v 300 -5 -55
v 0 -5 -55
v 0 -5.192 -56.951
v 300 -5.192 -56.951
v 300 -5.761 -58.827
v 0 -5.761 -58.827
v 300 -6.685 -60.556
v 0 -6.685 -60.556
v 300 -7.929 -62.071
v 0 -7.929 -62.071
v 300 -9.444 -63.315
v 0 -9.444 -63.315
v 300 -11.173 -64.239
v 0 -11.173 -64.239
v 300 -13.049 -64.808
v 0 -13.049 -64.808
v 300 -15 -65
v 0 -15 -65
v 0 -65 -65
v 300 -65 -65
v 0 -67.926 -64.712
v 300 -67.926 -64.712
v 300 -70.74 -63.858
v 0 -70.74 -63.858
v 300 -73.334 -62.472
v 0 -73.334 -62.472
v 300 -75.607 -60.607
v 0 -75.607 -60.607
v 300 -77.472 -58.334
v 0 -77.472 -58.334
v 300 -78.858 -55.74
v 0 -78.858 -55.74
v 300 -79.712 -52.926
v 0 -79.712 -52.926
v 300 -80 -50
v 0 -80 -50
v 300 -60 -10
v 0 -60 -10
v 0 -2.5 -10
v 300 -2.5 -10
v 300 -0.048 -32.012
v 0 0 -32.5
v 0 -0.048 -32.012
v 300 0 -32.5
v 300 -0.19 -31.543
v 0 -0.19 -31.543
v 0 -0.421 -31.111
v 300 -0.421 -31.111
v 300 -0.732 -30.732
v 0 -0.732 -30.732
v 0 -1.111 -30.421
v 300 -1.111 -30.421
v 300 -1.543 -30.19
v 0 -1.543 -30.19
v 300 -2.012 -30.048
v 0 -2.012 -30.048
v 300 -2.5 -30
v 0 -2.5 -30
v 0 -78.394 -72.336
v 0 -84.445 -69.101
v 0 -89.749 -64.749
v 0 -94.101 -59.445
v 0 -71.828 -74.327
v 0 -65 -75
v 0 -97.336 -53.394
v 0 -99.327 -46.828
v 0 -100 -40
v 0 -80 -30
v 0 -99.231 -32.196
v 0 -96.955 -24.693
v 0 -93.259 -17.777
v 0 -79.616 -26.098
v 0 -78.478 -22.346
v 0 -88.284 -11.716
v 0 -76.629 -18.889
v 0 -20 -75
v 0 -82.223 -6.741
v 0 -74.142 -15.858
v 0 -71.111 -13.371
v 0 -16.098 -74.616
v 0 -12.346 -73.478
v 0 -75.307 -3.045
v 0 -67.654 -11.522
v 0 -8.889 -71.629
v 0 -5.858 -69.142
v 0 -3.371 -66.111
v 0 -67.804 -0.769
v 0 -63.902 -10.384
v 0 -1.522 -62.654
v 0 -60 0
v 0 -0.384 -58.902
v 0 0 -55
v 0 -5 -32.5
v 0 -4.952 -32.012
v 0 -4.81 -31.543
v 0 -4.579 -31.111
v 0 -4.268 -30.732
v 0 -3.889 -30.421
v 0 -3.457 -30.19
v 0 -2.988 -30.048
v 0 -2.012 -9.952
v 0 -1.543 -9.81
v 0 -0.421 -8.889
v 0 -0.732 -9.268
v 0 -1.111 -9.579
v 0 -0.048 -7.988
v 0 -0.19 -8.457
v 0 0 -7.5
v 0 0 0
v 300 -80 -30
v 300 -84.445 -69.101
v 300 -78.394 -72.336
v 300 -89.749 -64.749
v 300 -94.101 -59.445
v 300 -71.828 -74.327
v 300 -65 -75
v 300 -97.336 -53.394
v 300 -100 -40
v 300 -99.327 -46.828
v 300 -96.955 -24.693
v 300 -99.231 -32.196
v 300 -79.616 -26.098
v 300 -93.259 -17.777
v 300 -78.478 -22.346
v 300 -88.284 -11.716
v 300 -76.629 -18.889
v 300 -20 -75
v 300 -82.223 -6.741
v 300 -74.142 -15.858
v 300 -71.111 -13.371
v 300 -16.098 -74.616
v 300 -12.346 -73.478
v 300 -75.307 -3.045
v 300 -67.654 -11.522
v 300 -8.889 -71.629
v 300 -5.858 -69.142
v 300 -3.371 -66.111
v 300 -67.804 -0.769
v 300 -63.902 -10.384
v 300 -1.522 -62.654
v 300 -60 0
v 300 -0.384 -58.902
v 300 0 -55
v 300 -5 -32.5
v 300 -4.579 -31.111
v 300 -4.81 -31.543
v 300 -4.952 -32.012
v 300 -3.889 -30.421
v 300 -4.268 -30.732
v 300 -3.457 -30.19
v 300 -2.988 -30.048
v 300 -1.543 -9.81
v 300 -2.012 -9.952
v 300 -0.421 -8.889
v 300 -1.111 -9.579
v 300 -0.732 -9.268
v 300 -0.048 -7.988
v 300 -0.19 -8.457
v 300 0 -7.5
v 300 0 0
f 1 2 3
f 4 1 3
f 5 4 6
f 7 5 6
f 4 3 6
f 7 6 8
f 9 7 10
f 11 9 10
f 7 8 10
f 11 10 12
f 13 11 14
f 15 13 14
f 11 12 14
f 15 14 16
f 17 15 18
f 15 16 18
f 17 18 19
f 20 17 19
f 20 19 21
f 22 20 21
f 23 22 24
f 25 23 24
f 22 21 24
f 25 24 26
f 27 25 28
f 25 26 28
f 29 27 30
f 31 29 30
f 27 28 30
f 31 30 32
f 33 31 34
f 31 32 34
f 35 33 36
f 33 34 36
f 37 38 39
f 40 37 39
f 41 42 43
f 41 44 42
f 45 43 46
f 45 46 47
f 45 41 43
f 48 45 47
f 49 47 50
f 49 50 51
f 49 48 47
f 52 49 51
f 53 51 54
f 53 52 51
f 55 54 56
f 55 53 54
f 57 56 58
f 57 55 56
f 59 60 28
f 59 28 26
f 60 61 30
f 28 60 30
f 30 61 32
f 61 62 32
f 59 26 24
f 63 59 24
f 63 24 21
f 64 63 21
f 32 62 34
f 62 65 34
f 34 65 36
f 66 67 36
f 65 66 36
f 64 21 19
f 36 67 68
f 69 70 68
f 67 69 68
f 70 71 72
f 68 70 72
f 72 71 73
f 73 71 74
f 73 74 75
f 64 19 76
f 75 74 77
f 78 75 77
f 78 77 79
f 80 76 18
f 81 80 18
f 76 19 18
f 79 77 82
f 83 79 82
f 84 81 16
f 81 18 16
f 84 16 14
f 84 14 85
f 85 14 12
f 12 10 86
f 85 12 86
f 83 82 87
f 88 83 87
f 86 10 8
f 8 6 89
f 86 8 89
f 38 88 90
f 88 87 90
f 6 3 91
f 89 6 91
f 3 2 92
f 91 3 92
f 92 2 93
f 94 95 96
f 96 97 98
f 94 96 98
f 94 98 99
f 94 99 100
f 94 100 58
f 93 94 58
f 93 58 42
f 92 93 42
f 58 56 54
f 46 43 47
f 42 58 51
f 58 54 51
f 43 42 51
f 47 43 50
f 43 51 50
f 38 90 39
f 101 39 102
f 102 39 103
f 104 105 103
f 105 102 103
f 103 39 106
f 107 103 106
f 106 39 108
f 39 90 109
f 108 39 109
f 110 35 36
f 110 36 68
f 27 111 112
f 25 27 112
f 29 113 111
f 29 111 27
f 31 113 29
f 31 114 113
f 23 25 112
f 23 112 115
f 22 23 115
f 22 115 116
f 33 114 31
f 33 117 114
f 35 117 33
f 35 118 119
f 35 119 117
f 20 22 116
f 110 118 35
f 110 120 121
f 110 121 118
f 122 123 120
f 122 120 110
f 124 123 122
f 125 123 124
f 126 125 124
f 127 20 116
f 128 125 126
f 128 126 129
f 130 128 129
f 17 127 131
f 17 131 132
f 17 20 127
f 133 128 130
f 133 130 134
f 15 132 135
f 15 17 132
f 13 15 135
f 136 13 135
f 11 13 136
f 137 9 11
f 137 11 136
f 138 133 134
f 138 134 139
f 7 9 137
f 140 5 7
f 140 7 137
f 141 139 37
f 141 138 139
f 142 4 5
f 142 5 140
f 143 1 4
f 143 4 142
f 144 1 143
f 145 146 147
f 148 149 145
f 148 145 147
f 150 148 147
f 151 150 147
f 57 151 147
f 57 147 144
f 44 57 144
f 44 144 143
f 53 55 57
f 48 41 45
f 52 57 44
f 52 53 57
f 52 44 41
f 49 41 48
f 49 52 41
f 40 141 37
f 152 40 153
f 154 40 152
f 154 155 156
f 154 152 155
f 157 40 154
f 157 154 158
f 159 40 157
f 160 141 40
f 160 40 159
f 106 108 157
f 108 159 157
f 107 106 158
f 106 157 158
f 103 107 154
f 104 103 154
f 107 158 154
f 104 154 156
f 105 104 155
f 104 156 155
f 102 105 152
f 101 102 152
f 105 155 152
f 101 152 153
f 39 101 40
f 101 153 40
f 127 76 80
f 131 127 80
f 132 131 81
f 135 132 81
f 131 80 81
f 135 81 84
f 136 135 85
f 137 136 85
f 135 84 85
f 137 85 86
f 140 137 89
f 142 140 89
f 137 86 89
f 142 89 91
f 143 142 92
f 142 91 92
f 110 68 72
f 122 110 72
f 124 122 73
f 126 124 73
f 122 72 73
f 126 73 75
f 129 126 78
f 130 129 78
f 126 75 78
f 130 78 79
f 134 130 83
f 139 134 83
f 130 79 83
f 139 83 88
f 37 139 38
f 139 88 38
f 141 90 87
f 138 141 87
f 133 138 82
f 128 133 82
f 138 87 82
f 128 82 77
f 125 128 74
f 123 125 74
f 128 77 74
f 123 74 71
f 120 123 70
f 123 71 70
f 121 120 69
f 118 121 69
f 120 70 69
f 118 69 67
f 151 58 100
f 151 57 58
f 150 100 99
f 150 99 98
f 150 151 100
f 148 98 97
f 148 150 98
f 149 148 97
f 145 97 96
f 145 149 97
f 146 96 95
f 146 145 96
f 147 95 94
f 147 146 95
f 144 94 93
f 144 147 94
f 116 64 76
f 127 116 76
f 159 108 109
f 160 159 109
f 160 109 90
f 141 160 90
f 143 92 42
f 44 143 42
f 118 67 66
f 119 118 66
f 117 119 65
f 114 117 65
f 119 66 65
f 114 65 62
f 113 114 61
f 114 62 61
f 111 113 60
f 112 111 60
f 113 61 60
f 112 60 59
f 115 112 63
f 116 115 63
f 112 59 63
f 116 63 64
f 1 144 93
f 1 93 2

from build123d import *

# Parameters (mm, degrees)
F1_DEPTH = 300
F2_R     = 2.49999


# Not quite as in the source:
# - a fillet or chamfer is up to 0.001 mm smaller than in the source, because OpenCascade refuses the exact size


with BuildPart() as f1:
    # F0 (on Right) → F1 (new body)
    with BuildSketch(Plane.YZ):
        with BuildLine():
            Line((0, -10), (0, 0))
            Line((0, 0), (-60, 0))
            ThreePointArc((-60, 0), (-88.2842712475, -11.7157287525), (-100, -40))
            ThreePointArc((-100, -40), (-89.7487373415, -64.7487373415), (-65, -75))
            Line((-65, -75), (-20, -75))
            ThreePointArc((-20, -75), (-5.8578643763, -69.1421356237), (0, -55))
            Line((0, -55), (0, -30))
            Line((0, -30), (-5, -30))
            Line((-5, -30), (-5, -55))
            ThreePointArc((-5, -55), (-7.9289321881, -62.0710678119), (-15, -65))
            Line((-15, -65), (-65, -65))
            ThreePointArc((-65, -65), (-75.6066017178, -60.6066017178), (-80, -50))
            Line((-80, -50), (-80, -30))
            ThreePointArc((-80, -30), (-74.1421356237, -15.8578643763), (-60, -10))
            Line((-60, -10), (0, -10))
        make_face()
    extrude(amount=F1_DEPTH)

    # F2 (radius 2.5 in the source; OpenCascade refuses exactly that, so slightly less here)
    f2_edges = [f1.edges().sort_by_distance(p)[0] for p in [
        (150, 0, -10),
        (150, 0, -30),
        (150, -5, -30),
    ]]
    fillet(f2_edges, radius=F2_R)


solid = f1.part
